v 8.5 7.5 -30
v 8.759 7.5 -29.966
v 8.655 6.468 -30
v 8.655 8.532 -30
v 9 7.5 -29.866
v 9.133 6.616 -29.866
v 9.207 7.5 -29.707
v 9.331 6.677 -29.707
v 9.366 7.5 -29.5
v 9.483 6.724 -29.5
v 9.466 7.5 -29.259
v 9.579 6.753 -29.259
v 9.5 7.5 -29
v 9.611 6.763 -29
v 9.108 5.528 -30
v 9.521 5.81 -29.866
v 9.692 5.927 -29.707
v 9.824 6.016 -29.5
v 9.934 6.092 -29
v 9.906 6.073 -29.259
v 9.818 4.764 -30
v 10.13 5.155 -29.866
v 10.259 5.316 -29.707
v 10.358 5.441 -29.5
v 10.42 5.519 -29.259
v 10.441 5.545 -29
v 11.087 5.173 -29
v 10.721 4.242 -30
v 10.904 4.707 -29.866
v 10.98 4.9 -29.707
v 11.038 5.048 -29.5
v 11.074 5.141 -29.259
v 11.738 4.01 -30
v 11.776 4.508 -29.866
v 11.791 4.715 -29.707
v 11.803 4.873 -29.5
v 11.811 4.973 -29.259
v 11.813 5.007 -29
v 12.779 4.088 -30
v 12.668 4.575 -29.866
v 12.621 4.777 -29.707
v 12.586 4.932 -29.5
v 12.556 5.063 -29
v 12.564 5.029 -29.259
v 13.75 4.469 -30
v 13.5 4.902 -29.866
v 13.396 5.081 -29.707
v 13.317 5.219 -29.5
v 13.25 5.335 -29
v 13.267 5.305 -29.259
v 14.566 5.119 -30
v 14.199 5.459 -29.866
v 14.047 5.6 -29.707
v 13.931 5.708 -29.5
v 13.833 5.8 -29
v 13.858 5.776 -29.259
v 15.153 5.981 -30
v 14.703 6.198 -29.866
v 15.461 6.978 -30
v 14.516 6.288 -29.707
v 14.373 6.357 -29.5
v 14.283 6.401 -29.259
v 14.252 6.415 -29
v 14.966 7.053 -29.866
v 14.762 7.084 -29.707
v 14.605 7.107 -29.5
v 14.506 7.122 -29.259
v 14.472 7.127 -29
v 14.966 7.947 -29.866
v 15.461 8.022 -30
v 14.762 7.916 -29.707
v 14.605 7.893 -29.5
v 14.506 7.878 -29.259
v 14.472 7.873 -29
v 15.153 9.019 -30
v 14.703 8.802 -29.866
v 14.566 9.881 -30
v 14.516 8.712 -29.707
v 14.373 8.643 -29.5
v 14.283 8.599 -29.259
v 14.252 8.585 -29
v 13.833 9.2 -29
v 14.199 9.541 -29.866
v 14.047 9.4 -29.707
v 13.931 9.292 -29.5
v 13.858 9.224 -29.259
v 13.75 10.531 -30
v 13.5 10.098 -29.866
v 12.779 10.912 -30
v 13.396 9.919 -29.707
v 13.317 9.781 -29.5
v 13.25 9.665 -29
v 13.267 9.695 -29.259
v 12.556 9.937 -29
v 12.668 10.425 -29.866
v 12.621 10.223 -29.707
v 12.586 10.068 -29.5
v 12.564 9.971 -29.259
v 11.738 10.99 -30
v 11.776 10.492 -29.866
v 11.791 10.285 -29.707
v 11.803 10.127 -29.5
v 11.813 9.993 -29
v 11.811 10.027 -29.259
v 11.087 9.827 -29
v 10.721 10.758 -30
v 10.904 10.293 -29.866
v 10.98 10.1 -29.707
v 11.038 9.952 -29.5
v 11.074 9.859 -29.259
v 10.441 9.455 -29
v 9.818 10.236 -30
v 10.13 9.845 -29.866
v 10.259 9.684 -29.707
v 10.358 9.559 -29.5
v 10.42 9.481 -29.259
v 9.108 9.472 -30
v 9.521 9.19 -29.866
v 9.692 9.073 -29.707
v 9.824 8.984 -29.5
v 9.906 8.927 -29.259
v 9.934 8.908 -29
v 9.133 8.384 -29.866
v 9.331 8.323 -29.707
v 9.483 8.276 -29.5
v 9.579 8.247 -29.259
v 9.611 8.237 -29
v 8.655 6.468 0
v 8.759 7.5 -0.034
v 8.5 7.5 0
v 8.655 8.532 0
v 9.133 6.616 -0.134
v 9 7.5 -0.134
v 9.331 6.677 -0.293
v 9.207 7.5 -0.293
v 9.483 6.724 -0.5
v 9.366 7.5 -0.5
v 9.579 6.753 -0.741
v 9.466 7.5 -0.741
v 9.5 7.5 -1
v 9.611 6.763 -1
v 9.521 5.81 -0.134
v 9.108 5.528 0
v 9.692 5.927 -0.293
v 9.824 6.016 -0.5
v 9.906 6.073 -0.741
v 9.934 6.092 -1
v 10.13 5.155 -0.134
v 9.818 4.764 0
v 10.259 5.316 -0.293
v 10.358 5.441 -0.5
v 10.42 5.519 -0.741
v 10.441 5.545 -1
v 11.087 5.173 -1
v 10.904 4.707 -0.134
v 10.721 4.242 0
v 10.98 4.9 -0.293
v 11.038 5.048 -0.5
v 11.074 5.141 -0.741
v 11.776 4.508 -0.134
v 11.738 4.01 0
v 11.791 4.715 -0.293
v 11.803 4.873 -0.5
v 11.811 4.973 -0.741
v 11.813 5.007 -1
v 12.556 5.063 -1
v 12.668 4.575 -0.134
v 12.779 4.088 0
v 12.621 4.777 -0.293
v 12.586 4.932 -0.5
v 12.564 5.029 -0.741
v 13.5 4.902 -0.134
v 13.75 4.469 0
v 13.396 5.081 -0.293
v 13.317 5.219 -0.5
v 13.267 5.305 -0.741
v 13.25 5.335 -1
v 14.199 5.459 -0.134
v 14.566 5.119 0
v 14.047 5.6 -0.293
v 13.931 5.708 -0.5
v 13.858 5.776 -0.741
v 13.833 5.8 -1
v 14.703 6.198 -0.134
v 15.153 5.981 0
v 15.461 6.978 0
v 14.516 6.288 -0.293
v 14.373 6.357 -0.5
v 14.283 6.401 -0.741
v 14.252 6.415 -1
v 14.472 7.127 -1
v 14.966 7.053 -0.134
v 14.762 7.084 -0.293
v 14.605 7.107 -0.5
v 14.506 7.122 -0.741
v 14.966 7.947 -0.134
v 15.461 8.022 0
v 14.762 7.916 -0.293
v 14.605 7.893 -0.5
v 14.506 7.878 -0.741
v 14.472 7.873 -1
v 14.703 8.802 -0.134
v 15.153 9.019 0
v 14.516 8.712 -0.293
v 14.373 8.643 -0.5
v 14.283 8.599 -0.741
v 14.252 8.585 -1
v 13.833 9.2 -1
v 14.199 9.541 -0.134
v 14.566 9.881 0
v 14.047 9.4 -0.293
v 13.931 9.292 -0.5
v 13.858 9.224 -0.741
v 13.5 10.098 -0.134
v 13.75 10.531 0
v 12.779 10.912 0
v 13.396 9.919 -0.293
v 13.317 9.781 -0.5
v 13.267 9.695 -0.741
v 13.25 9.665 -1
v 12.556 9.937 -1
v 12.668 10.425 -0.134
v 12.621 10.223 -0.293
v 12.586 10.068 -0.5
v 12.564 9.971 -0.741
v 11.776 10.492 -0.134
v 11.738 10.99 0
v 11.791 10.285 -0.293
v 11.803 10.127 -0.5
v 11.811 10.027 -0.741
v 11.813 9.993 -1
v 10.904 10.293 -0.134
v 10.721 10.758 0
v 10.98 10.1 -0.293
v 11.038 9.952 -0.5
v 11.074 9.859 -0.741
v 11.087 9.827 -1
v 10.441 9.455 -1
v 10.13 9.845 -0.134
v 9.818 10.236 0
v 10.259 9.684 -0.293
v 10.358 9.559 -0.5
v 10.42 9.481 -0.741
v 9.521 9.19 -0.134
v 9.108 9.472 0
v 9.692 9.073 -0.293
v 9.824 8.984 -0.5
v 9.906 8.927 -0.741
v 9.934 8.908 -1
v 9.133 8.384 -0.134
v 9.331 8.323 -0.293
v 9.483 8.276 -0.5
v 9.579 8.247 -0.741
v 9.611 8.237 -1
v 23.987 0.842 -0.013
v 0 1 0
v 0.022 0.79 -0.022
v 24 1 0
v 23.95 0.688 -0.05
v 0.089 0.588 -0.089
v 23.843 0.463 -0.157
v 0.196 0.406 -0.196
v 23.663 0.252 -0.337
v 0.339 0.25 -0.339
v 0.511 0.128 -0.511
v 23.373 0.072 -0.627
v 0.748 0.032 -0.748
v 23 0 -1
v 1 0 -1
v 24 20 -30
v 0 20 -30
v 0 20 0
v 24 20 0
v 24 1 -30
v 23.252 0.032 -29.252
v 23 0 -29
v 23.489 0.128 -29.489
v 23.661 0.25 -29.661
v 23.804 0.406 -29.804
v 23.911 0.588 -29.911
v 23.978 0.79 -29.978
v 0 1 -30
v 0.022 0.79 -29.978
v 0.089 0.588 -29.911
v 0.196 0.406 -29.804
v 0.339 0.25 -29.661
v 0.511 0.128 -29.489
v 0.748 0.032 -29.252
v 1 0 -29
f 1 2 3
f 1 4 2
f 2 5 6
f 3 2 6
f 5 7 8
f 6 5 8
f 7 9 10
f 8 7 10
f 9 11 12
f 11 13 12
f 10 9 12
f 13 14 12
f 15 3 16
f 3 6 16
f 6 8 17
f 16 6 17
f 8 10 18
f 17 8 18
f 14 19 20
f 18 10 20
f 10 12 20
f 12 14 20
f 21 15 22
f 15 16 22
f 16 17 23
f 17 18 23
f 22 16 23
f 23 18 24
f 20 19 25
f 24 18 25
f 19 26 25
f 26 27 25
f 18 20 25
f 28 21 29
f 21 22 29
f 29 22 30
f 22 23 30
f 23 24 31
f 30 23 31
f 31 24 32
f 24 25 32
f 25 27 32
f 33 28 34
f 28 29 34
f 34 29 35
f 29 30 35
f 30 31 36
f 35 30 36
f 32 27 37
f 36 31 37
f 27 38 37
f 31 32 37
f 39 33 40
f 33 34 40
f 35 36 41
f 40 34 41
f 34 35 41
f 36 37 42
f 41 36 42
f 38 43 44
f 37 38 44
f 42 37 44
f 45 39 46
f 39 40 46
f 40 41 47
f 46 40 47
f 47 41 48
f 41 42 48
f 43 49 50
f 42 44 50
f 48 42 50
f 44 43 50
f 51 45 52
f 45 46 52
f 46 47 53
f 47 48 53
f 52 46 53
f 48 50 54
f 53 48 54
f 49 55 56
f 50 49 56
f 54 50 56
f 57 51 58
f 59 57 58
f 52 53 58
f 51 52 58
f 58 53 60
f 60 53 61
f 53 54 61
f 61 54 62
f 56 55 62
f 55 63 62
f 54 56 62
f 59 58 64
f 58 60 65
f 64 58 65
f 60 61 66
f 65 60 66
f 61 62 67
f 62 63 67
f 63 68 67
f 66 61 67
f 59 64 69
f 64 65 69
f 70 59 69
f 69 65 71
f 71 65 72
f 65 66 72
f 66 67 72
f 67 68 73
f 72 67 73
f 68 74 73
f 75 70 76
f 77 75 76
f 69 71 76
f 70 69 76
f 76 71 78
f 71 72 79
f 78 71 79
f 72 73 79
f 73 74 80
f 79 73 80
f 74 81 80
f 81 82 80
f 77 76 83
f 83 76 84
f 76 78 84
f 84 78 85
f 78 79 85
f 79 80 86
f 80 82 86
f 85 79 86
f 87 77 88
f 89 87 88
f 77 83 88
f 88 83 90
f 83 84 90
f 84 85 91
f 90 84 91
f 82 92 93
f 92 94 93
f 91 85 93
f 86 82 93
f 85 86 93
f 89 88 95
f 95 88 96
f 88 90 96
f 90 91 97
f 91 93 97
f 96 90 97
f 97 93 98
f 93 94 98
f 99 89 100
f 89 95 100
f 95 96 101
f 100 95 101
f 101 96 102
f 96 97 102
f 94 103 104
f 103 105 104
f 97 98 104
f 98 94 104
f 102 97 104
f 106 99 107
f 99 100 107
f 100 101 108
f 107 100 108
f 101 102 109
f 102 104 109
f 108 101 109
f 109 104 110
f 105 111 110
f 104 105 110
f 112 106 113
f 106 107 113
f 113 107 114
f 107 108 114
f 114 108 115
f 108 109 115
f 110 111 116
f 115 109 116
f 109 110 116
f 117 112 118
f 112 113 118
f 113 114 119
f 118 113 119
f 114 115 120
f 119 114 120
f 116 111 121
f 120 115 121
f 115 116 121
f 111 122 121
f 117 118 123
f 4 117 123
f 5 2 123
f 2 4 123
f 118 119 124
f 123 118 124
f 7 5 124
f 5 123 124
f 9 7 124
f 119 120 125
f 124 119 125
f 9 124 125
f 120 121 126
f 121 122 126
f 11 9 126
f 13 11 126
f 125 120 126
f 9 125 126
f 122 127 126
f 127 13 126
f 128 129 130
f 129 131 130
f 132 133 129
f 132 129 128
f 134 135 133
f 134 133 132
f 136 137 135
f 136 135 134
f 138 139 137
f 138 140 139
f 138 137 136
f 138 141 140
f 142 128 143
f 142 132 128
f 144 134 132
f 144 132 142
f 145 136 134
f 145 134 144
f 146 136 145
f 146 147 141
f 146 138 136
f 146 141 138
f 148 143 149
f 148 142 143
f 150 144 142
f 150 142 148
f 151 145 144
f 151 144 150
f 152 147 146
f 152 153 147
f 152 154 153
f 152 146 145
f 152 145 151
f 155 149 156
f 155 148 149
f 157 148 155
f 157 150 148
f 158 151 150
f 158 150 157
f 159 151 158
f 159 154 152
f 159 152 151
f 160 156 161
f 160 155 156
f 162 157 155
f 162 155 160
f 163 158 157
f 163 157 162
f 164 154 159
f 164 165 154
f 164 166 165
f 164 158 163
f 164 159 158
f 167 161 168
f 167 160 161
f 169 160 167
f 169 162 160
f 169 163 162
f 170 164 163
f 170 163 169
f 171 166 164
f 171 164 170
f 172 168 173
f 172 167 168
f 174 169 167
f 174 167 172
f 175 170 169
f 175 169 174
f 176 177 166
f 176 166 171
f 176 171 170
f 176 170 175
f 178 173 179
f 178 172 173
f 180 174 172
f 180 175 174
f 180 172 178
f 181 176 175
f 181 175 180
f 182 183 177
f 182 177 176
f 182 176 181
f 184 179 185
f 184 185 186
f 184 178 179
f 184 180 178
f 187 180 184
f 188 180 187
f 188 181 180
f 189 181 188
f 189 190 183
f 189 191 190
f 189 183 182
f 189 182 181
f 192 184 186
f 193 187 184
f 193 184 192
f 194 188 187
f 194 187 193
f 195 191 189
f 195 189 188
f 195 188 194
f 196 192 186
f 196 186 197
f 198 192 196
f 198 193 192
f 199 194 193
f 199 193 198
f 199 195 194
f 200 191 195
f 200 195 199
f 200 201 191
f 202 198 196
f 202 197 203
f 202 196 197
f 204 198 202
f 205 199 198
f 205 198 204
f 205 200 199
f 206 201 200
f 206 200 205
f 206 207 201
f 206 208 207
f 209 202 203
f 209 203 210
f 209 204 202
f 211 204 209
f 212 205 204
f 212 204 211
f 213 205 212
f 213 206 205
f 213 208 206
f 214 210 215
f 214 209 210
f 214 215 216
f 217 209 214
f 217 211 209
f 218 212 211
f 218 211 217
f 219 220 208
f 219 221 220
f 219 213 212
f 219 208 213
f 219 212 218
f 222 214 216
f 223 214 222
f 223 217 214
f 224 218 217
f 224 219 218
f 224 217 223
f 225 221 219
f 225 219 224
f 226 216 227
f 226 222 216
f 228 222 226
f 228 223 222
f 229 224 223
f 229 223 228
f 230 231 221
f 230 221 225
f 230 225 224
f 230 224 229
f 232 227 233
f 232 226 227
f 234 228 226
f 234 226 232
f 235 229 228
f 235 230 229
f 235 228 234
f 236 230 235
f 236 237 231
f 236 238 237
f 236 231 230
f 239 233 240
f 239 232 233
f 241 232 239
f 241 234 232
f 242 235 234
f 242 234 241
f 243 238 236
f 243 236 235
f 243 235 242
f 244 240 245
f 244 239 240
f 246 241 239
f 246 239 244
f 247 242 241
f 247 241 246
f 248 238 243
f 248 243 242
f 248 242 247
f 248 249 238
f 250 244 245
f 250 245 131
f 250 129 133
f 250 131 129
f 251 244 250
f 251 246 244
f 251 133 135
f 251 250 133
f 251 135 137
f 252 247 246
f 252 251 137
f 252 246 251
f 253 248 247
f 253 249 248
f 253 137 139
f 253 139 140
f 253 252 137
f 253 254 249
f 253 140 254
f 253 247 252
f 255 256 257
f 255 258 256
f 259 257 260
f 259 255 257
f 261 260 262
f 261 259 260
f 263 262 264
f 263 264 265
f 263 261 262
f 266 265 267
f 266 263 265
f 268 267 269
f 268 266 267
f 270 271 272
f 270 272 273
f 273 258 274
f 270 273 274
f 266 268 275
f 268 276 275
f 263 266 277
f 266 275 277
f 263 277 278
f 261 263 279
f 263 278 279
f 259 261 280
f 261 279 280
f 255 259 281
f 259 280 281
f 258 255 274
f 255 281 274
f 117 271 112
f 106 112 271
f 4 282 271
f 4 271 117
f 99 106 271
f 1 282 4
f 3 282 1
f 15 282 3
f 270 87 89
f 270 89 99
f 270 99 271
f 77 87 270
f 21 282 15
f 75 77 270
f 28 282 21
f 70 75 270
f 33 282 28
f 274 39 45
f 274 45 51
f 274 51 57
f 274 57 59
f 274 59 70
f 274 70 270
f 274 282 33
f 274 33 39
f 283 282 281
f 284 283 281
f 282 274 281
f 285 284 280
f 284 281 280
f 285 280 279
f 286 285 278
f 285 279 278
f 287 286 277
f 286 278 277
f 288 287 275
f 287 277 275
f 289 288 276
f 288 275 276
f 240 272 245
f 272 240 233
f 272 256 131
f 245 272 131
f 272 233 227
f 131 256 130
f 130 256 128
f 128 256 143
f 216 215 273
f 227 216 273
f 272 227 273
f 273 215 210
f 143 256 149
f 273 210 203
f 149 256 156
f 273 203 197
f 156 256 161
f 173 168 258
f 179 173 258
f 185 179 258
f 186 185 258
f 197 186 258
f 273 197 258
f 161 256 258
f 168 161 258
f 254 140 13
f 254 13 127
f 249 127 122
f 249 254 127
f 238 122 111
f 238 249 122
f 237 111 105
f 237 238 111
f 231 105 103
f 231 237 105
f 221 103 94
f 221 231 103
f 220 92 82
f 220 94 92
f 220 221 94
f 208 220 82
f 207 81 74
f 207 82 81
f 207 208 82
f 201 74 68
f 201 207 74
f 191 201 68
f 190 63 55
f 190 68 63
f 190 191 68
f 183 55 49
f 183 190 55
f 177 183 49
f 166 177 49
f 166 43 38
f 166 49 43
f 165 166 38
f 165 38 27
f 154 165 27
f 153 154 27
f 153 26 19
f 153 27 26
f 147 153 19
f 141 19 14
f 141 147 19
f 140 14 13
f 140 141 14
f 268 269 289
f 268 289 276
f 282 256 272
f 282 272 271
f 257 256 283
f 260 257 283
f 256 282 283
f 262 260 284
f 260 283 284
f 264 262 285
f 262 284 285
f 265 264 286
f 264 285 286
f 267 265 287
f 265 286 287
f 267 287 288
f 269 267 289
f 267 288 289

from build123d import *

# Parameters (mm, degrees)
SKETCH1_W               = 24
SKETCH1_H               = 30
BOSS_EXTRUDE1_DEPTH     = 20
CUT_EXTRUDE1_DEPTH      = 44.312815655
CUT_EXTRUDE1_DEPTH_BACK = 44.312815655
SKETCH2_R               = 2.5
FILLET1_R               = 1


with BuildPart() as part:
    # Sketch1 → Boss-Extrude1 (new body)
    with BuildSketch(Plane(origin=(0, 0, 0), x_dir=(1, 0, 0), z_dir=(0, 1, 0))):
        with Locations((12, 15)):
            Rectangle(SKETCH1_W, SKETCH1_H)
    extrude(amount=BOSS_EXTRUDE1_DEPTH)

    # Sketch2 → Cut-Extrude1 (cut, two sides: drawn at the far end of the back side and taken through both)
    with BuildSketch(Plane(origin=(0, 0, -30), x_dir=(-1, 0, 0), z_dir=(0, 0, -1)).offset(-CUT_EXTRUDE1_DEPTH_BACK)):
        with Locations((-12, 7.5)):
            Circle(SKETCH2_R)
    extrude(amount=CUT_EXTRUDE1_DEPTH + CUT_EXTRUDE1_DEPTH_BACK, mode=Mode.SUBTRACT)

    # Fillet1
    fillet1_edges = [part.edges().sort_by_distance(p)[0] for p in [
        (14.5, 7.5, 0),
        (14.5, 7.5, -30),
        (12, 0, -30),
        (24, 0, -15),
        (12, 0, 0),
        (0, 0, -15),
    ]]
    fillet(fillet1_edges, radius=FILLET1_R)


solid = part.part
